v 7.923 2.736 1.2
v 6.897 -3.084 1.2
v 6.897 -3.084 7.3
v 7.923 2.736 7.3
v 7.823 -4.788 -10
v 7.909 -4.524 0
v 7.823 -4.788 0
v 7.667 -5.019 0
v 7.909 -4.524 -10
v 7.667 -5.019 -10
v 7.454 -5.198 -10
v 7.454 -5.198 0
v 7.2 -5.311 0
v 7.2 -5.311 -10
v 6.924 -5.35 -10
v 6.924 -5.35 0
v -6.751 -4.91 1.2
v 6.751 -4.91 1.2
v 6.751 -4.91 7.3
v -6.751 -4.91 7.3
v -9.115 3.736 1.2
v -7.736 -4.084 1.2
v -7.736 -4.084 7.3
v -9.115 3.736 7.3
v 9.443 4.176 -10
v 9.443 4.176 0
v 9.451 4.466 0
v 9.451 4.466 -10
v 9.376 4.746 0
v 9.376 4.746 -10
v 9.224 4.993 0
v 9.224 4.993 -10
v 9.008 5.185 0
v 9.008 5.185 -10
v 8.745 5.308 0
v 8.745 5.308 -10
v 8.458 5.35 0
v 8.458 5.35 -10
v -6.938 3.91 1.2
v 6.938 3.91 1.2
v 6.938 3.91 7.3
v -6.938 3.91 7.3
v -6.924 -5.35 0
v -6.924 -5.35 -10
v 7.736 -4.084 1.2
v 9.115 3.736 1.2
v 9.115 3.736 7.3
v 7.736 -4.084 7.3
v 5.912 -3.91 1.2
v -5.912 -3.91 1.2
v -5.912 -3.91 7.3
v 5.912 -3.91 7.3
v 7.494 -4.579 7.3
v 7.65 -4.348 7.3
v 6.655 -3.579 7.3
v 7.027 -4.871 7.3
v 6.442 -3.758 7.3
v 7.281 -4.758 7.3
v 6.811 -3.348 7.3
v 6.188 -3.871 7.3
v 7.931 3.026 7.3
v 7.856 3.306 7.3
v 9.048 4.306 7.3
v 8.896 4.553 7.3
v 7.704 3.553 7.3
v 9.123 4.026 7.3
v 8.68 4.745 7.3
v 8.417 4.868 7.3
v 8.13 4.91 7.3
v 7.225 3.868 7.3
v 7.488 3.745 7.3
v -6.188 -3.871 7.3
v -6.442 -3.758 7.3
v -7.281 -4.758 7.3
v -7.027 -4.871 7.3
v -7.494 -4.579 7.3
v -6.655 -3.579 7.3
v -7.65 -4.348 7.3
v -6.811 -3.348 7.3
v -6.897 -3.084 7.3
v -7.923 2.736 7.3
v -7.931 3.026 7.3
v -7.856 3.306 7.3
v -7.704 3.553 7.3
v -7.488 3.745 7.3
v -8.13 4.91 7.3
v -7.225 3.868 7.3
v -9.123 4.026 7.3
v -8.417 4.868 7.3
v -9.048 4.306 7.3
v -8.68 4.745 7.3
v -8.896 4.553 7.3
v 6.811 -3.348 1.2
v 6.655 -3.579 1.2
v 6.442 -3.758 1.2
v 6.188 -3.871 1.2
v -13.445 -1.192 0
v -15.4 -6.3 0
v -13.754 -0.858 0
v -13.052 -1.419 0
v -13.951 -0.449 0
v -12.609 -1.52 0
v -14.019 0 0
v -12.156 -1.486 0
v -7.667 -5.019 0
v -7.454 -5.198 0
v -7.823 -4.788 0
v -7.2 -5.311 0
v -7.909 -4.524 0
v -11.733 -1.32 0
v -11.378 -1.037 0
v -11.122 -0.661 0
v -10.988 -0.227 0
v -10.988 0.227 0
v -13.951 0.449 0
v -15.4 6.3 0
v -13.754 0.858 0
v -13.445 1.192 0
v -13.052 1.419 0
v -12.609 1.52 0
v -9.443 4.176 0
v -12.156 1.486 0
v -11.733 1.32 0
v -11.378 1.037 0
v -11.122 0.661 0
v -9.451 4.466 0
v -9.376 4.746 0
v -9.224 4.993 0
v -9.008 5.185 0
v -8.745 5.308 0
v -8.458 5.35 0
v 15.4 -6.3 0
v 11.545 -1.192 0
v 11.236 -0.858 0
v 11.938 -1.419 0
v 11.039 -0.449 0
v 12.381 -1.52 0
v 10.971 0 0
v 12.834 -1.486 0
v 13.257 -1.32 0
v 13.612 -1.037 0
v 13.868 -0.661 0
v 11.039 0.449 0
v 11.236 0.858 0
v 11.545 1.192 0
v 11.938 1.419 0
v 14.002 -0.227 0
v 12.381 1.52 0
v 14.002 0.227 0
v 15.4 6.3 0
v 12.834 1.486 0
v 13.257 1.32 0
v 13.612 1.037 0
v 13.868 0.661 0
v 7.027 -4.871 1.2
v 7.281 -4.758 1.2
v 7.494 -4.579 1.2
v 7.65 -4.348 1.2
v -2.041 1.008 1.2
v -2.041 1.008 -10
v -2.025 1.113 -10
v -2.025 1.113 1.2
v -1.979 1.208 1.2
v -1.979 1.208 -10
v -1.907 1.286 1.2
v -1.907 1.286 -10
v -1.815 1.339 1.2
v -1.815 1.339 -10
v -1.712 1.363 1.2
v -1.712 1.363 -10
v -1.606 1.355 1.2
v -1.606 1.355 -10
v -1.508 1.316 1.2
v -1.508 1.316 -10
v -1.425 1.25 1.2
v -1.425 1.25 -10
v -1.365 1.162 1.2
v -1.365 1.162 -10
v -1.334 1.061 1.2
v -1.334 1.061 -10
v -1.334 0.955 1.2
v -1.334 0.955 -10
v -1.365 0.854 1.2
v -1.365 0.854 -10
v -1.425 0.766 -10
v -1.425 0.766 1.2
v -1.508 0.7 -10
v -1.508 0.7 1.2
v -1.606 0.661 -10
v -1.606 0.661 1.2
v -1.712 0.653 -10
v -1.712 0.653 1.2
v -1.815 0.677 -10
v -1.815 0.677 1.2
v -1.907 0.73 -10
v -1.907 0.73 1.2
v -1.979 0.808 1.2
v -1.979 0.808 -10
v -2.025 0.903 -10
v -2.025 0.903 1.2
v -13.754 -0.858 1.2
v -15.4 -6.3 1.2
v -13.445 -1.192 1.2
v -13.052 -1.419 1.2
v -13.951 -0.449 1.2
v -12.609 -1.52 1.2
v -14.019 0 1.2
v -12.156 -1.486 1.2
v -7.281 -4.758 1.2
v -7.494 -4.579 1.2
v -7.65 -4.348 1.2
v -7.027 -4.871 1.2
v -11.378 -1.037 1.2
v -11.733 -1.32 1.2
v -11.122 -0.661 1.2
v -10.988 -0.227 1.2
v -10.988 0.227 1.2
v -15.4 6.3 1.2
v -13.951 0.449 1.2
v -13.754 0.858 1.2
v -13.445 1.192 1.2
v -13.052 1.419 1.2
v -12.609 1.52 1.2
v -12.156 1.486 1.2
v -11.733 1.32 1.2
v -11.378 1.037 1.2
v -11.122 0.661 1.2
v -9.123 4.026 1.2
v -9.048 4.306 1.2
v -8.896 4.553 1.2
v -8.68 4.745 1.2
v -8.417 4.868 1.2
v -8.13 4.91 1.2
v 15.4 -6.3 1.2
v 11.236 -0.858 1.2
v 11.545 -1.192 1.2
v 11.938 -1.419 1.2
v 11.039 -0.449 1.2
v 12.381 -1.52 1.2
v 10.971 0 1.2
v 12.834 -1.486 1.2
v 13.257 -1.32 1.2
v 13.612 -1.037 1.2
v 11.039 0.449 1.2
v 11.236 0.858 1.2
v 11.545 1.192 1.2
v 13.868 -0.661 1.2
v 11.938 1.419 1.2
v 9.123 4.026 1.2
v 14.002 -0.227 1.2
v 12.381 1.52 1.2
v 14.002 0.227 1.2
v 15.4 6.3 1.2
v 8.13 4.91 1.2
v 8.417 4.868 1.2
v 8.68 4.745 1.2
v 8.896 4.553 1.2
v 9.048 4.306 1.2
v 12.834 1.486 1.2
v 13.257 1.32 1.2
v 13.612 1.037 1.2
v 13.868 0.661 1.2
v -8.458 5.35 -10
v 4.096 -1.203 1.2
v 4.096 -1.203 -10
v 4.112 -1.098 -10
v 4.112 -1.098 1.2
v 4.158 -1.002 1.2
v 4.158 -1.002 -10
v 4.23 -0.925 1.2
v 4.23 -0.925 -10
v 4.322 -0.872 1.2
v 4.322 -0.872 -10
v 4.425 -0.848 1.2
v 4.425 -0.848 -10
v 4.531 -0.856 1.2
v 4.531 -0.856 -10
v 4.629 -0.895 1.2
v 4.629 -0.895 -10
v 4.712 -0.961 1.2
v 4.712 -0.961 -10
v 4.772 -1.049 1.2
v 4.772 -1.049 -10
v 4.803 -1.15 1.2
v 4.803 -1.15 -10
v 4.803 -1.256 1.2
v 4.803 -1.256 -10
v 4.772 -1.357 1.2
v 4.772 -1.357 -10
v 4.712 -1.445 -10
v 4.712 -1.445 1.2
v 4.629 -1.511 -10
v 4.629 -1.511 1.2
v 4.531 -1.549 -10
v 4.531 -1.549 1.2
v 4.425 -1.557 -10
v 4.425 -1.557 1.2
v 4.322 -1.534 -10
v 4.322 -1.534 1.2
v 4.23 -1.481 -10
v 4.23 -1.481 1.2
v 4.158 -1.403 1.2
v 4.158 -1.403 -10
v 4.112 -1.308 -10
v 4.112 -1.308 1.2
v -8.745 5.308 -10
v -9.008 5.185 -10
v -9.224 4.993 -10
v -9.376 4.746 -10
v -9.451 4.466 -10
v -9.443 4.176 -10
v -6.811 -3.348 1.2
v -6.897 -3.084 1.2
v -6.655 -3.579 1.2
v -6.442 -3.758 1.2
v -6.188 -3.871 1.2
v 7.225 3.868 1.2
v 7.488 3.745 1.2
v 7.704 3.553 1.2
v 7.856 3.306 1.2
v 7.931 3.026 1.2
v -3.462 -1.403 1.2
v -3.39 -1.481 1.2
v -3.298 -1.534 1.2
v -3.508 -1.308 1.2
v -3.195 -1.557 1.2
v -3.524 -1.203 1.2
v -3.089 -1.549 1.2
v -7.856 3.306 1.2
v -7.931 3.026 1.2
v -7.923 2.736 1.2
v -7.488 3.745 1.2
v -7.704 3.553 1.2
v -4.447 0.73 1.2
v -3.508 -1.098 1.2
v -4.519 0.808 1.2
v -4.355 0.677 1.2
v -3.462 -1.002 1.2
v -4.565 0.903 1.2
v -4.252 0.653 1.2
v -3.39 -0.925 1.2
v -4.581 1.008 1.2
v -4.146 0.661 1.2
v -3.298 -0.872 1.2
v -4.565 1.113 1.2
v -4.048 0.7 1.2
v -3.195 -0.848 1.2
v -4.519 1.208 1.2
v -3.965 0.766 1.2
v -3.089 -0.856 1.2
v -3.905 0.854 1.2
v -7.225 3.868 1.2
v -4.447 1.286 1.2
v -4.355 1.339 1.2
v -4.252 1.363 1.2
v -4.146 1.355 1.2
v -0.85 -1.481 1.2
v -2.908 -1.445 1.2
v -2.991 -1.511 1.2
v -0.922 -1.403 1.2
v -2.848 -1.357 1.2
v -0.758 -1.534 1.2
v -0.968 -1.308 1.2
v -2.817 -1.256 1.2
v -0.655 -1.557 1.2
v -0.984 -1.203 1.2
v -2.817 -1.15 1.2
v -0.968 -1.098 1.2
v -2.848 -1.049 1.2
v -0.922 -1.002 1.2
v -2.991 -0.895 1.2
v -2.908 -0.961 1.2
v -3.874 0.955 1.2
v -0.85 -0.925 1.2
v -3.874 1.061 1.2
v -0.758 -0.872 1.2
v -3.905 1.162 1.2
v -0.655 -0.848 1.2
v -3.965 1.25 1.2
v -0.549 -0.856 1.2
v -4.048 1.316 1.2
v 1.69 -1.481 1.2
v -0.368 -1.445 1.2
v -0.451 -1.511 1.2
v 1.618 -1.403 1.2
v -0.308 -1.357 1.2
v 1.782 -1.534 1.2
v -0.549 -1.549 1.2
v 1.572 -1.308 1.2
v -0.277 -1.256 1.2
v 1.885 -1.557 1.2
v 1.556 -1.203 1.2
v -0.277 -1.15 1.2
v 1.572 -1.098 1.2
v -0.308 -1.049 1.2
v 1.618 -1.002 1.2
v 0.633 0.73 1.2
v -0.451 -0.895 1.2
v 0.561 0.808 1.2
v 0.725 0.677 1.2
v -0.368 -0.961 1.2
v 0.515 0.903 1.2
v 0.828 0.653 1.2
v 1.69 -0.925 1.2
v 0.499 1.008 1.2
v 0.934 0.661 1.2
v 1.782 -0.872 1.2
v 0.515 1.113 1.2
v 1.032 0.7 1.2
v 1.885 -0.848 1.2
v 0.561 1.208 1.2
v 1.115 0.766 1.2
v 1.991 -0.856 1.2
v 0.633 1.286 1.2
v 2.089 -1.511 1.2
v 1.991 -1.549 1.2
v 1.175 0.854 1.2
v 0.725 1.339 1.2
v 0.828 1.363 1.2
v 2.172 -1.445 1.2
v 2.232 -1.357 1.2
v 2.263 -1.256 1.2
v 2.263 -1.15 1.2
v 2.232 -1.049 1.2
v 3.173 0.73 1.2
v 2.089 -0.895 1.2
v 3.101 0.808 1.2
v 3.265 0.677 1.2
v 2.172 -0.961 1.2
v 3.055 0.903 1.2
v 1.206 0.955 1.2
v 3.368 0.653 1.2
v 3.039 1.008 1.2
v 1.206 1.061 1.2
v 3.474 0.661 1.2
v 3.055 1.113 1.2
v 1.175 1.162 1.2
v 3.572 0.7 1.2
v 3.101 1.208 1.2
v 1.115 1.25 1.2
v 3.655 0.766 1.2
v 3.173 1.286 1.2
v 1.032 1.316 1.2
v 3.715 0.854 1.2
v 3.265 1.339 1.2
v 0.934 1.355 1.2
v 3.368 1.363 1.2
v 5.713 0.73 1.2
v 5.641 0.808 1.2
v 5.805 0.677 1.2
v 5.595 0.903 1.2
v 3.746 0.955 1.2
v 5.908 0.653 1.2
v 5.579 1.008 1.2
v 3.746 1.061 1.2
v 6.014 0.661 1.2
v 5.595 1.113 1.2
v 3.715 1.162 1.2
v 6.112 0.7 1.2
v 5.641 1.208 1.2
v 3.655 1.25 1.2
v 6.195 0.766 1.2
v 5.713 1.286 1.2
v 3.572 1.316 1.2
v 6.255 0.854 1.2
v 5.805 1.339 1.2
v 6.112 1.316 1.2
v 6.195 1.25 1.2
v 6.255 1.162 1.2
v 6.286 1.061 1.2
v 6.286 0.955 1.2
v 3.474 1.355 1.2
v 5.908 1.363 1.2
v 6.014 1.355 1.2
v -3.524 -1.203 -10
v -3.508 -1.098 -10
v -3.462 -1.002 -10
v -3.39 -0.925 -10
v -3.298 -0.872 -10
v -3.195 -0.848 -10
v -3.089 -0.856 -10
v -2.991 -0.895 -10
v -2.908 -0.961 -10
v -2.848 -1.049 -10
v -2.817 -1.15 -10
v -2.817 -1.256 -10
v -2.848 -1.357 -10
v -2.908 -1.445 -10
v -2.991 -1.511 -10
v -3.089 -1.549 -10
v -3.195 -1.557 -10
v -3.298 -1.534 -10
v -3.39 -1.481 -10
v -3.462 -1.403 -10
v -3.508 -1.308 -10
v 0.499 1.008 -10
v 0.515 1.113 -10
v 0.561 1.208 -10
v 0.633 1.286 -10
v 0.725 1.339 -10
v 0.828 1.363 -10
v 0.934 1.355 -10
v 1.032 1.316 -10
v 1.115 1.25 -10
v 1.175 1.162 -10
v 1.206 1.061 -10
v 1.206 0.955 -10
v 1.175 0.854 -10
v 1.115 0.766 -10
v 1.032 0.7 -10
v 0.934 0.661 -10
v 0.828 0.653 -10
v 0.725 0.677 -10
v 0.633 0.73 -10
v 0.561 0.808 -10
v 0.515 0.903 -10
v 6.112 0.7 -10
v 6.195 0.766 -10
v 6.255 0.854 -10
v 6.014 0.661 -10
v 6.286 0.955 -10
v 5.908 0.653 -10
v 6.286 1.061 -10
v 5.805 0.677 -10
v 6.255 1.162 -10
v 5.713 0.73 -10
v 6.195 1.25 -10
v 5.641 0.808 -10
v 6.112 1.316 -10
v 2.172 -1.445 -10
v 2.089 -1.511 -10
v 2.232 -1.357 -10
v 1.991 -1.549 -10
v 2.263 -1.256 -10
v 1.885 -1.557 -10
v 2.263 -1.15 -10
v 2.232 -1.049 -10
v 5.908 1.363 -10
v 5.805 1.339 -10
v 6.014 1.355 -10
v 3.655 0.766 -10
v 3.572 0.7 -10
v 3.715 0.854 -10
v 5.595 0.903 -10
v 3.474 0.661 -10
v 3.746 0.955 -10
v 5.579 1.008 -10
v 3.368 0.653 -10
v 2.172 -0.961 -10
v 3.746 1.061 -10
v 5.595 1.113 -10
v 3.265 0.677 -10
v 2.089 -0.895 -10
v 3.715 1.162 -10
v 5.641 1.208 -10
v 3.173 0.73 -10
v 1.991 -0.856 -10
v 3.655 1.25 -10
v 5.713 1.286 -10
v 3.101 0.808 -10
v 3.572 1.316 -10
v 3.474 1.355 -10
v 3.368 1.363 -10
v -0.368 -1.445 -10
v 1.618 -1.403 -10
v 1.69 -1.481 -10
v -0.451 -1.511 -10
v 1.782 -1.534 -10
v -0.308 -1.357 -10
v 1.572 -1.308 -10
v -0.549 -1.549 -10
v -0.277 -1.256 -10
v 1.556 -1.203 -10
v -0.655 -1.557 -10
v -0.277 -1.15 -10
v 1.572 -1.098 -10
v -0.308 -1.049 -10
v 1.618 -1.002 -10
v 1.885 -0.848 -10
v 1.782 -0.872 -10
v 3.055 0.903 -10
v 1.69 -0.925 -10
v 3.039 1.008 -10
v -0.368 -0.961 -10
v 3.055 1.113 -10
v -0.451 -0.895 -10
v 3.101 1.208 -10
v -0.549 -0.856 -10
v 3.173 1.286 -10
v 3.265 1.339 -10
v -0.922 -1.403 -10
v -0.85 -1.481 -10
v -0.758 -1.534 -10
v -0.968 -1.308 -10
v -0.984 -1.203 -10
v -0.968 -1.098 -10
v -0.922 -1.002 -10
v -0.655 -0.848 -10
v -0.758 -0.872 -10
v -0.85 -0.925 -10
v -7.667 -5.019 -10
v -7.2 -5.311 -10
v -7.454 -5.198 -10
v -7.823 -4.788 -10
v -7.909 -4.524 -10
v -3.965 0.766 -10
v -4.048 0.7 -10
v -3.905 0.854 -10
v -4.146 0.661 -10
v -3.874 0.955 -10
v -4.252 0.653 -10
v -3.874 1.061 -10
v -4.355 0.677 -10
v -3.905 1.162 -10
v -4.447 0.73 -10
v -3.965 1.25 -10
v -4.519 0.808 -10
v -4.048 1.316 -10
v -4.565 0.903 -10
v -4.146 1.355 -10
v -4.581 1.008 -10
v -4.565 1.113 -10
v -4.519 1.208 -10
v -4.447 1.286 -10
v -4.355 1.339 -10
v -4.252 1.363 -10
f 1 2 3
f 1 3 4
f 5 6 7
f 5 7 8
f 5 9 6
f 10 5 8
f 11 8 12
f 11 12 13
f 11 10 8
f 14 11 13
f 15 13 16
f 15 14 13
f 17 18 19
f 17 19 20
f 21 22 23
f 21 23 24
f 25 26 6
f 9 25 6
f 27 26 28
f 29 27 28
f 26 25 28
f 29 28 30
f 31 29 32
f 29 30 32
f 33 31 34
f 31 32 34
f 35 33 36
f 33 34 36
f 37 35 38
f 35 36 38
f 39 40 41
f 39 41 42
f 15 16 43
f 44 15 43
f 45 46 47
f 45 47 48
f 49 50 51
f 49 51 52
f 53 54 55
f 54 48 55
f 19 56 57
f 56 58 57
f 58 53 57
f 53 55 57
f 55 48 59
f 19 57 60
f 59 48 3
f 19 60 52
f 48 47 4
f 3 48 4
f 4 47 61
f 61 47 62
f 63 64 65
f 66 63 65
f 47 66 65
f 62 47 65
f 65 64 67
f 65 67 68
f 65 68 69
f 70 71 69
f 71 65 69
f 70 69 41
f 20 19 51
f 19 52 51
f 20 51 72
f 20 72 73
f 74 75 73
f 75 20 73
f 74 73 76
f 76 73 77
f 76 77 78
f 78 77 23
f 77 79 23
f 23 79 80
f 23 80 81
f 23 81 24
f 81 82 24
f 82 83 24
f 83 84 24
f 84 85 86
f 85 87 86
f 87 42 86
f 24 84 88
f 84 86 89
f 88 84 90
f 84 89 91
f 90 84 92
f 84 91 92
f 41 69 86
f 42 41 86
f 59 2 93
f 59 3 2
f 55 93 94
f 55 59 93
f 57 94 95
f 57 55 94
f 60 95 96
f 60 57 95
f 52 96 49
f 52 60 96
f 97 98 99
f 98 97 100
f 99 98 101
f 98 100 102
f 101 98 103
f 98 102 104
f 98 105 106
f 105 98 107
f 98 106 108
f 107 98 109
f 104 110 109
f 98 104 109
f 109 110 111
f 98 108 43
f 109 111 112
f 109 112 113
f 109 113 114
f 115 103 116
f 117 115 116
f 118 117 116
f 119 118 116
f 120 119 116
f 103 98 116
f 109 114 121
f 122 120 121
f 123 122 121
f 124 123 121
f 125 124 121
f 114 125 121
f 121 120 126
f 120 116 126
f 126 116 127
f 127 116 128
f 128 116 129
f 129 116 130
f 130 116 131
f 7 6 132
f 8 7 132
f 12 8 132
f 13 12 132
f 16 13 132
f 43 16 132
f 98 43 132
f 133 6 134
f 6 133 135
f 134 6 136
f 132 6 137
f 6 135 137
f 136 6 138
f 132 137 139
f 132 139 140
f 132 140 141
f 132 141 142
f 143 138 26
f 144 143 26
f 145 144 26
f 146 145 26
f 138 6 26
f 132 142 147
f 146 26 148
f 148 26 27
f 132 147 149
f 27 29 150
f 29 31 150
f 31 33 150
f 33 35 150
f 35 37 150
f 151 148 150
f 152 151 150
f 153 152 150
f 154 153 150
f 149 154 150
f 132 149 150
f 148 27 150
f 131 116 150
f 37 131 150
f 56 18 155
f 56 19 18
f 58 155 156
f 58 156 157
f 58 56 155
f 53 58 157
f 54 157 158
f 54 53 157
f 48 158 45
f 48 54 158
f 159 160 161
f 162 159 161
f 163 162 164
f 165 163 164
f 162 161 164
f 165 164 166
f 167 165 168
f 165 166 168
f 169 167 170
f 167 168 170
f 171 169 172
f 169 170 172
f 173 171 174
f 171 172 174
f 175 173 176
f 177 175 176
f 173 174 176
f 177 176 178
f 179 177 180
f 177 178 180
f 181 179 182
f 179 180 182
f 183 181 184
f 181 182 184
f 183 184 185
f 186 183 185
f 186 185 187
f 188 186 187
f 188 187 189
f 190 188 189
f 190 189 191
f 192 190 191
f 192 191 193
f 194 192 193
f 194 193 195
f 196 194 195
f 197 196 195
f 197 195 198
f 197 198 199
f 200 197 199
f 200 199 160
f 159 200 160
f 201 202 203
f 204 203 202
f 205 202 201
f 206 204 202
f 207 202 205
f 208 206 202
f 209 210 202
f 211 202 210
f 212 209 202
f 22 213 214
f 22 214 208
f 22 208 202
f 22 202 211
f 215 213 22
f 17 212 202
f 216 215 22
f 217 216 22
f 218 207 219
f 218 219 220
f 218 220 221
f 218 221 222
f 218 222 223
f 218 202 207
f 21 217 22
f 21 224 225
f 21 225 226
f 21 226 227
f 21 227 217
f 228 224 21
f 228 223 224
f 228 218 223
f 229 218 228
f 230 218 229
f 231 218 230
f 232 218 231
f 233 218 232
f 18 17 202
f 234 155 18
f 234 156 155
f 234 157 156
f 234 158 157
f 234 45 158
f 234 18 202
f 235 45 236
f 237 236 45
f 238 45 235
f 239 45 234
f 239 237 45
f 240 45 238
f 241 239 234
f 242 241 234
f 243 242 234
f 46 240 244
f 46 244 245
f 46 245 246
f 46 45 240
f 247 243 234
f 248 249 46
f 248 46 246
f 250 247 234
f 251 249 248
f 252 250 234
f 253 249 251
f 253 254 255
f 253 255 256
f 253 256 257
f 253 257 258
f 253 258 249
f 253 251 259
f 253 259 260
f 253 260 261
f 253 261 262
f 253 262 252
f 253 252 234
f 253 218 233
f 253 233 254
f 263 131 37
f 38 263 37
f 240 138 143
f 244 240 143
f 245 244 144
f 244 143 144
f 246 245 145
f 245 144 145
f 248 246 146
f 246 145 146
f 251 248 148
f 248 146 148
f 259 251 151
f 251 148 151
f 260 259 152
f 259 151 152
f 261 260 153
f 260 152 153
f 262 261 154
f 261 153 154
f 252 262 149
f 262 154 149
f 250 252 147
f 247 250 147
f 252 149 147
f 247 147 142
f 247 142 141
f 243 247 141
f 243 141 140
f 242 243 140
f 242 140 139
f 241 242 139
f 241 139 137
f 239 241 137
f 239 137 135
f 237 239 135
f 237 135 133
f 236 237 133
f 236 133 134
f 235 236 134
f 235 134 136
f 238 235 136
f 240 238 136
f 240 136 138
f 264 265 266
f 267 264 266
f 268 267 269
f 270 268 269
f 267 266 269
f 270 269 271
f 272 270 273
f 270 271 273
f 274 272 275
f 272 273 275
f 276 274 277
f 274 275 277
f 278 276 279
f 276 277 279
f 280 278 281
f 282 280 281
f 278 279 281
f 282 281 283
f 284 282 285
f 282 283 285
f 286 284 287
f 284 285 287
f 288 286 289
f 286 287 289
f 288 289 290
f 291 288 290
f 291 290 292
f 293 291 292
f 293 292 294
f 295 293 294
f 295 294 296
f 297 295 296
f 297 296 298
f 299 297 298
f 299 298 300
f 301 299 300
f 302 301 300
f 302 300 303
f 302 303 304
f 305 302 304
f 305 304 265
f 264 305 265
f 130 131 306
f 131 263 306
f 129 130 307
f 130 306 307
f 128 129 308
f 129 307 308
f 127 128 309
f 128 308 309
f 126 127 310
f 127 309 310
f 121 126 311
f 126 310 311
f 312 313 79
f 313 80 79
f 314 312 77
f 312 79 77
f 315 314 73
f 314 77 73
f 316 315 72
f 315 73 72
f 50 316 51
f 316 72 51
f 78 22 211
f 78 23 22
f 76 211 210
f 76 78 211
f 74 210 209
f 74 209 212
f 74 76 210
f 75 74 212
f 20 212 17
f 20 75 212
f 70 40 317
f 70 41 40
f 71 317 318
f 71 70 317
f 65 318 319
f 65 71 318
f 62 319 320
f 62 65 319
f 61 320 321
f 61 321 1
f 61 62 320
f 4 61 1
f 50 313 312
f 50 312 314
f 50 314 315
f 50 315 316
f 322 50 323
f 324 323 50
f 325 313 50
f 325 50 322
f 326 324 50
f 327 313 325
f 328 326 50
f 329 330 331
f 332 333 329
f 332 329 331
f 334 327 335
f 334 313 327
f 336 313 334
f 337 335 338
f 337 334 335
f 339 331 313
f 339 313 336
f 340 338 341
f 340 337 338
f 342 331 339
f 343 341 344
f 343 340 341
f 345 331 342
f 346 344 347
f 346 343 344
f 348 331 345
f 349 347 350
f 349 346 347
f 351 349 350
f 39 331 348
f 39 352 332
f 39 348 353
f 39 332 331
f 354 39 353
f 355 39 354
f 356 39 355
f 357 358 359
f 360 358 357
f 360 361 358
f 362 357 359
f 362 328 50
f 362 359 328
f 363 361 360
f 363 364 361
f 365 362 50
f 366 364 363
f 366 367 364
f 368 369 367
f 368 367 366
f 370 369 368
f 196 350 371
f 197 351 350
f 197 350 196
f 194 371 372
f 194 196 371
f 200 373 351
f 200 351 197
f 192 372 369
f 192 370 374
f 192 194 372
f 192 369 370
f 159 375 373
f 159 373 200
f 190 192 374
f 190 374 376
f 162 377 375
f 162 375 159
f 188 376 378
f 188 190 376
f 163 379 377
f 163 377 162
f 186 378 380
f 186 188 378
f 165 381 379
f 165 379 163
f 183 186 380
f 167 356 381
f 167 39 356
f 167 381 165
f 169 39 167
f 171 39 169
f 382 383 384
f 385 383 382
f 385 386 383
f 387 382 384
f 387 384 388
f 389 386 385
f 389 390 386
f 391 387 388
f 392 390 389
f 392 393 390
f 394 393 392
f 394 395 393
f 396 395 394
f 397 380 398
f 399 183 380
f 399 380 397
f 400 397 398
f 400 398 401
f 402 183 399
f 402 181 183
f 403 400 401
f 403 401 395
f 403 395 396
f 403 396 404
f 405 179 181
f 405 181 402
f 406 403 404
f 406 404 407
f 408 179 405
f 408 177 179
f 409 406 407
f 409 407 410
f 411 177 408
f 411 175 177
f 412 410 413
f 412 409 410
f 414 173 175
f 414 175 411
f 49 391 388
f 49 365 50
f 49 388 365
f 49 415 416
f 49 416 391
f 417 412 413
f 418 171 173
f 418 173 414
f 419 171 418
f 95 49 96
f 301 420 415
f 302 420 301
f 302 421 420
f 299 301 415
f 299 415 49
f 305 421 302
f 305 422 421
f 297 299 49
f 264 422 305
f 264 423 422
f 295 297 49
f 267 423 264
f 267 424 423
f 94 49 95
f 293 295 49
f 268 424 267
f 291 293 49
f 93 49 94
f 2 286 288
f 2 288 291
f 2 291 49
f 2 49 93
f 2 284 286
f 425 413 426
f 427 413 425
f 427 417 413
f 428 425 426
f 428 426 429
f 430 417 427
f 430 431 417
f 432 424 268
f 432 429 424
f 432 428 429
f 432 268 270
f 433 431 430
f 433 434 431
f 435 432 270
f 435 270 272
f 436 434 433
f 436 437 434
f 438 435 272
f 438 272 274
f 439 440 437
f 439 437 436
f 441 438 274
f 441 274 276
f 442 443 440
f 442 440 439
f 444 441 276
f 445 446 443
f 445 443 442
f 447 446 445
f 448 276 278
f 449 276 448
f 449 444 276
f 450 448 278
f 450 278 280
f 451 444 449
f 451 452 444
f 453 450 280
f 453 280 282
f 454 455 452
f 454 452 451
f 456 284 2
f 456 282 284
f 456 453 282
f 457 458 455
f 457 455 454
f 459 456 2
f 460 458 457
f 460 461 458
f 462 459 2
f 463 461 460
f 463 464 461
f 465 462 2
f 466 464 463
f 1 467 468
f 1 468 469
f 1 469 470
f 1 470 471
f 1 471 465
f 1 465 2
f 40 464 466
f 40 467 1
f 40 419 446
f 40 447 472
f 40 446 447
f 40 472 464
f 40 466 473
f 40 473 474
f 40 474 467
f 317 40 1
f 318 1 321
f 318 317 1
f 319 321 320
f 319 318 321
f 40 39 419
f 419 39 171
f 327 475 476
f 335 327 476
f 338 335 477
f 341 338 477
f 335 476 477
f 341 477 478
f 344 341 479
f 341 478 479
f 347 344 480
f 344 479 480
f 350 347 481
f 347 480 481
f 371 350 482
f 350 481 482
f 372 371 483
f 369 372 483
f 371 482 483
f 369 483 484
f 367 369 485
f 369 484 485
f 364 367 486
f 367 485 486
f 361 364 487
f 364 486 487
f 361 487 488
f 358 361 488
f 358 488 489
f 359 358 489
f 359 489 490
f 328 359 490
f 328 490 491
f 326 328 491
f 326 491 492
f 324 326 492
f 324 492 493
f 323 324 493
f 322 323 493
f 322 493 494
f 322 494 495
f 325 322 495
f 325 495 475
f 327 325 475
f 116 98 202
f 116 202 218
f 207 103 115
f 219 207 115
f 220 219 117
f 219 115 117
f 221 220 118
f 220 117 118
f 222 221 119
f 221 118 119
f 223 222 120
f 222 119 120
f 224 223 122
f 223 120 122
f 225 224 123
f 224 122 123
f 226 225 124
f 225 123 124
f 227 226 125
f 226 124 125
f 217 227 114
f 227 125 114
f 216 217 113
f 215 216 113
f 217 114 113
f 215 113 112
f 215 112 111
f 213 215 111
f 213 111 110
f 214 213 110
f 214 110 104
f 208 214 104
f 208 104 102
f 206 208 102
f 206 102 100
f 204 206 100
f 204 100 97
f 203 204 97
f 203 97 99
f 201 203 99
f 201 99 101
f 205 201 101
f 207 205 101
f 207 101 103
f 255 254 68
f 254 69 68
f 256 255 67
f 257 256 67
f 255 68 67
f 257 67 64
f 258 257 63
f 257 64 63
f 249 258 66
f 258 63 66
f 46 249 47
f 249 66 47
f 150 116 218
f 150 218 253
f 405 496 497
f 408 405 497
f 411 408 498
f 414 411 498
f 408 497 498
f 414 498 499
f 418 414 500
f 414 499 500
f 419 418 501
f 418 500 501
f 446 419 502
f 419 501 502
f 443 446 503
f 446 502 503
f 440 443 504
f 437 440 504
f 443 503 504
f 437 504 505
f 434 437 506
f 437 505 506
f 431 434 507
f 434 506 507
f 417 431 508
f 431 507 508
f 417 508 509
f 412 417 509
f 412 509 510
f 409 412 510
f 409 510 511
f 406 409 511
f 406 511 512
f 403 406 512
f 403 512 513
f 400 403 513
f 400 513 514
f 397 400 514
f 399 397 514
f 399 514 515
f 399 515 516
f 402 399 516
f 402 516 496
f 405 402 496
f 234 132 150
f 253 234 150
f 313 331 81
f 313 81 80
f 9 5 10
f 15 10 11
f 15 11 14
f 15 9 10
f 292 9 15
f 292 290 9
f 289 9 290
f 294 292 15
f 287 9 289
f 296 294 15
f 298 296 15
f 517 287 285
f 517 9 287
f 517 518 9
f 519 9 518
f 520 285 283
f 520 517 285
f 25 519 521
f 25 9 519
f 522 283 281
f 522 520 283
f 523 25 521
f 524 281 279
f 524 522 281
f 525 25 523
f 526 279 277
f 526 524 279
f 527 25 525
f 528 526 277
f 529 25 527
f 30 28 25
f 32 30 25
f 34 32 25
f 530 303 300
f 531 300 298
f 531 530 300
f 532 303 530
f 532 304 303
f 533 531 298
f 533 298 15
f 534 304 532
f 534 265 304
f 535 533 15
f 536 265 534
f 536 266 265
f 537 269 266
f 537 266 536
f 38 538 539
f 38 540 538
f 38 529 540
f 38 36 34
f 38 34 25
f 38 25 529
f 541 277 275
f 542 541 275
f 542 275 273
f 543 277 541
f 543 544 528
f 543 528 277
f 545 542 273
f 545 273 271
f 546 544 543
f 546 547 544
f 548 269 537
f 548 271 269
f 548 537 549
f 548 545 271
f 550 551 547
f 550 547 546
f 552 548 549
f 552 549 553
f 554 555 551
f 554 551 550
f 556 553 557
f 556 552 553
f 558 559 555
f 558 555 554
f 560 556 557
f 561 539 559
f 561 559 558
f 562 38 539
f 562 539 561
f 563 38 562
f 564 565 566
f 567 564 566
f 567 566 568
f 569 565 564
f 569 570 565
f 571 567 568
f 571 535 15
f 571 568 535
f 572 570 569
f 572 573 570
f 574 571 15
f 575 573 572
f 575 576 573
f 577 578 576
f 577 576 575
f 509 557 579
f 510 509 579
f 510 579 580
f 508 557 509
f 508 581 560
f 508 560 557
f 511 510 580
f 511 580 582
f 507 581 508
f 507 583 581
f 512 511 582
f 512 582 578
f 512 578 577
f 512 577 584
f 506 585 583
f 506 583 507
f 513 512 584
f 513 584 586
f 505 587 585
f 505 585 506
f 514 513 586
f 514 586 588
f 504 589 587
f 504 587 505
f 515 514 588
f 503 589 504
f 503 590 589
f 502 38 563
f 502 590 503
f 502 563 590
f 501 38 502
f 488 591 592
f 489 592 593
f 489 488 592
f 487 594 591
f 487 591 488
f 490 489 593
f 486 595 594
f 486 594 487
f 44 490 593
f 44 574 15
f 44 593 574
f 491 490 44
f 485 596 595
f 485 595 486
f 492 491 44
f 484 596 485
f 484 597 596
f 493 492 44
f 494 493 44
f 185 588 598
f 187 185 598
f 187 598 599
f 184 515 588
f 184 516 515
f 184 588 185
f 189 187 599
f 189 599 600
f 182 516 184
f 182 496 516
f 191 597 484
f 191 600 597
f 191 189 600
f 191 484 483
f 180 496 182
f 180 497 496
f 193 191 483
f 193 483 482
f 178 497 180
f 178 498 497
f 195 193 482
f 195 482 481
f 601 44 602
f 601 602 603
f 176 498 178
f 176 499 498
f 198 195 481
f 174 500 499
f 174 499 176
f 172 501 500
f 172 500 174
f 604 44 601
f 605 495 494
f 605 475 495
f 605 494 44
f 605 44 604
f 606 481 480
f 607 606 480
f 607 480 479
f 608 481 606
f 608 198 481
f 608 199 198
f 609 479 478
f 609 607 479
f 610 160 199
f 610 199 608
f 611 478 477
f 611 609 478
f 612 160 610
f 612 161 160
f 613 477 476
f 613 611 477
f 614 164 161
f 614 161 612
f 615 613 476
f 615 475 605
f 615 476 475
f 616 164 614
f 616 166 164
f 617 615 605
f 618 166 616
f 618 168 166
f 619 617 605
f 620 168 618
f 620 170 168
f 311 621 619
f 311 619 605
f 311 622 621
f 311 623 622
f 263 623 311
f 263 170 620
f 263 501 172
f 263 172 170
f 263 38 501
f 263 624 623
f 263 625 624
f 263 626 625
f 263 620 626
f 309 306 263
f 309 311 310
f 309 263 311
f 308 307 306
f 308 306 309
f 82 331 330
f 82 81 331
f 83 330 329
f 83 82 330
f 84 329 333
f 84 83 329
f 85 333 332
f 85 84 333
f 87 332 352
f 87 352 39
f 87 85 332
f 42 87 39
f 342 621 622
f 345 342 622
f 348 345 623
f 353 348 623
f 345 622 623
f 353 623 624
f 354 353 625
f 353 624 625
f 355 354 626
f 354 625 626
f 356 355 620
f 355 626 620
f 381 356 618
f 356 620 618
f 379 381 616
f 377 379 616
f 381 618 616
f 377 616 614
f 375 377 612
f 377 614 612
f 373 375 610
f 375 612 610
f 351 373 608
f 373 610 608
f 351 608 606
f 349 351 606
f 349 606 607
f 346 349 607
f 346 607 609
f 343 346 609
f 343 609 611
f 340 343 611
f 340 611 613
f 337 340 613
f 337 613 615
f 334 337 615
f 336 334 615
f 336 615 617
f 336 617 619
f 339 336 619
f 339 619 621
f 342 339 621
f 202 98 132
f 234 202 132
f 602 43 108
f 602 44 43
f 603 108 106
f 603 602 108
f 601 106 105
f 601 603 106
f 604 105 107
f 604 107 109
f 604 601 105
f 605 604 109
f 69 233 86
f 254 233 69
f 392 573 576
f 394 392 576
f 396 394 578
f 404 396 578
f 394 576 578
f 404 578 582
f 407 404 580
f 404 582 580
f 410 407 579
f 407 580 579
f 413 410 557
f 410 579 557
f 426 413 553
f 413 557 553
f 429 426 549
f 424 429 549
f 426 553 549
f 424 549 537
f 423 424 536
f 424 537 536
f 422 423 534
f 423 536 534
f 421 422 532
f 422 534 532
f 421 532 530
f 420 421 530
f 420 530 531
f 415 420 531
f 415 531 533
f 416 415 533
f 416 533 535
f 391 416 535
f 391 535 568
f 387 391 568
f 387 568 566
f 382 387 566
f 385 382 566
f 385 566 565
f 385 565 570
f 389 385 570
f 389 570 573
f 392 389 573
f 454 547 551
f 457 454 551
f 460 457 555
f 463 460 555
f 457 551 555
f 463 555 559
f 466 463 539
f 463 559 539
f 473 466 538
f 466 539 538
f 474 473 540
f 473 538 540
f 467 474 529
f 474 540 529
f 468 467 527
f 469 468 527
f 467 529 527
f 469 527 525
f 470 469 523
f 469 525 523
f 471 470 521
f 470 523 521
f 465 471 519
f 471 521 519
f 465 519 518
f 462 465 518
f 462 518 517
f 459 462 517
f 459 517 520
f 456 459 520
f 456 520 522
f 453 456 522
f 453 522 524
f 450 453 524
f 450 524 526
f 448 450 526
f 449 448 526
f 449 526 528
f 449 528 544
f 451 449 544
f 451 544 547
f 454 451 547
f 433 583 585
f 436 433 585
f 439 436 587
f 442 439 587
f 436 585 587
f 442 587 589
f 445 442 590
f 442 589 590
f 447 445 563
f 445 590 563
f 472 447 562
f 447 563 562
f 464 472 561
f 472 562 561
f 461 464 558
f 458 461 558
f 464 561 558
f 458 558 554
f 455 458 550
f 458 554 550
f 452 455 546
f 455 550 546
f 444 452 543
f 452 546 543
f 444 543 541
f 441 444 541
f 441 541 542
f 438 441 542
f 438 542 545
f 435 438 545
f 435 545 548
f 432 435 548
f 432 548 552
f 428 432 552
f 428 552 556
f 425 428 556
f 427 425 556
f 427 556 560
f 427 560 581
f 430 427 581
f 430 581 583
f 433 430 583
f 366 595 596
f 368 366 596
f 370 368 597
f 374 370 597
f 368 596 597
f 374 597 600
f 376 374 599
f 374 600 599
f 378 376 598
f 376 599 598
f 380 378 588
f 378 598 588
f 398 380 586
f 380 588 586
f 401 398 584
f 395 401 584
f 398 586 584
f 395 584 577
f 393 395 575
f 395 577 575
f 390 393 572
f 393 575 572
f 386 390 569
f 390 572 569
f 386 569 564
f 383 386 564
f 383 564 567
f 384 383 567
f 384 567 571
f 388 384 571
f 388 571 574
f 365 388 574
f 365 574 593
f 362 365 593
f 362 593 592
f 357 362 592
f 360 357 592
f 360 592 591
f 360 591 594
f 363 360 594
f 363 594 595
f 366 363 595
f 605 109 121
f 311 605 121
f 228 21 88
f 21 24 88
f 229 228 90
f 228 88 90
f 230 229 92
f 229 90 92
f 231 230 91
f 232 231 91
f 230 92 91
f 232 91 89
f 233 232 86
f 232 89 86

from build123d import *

# Parameters (mm, degrees)
SKETCH_1_W             = 30.8
SKETCH_1_H             = 12.6
EXTRUDE_1_DEPTH        = 1.2
EXTRUDE_2_DEPTH        = 6.1
EXTRUDE_3_DEPTH        = 10
HOLE_WIZARD_0000_1_D   = 0.7112
HOLE_WIZARD_0000_2_D   = 0.7112
PATTERN_LINEAR_1_COUNT = 5
PATTERN_LINEAR_1_PITCH = 2.54
PATTERN_LINEAR_2_COUNT = 4
PATTERN_LINEAR_2_PITCH = 2.54
HOLE_WIZARD_3_2_D      = 3.048
FILLET_1_R             = 1


with BuildPart() as part:
    # ｽｹｯﾁ1 → ﾎﾞｽ - 押し出し1 (new body)
    with BuildSketch(Plane.XY):
        Rectangle(SKETCH_1_W, SKETCH_1_H)
    extrude(amount=EXTRUDE_1_DEPTH)

    # ｽｹｯﾁ2 → ﾎﾞｽ - 押し出し2 (add)
    with BuildSketch(Plane.XY.offset(1.2)):
        Polygon((-9.321753593, 4.91), (9.321753593, 4.91), (7.590222642, -4.91), (-7.590222642, -4.91), align=None)
        Polygon((-6.751123011, -3.91), (6.751123011, -3.91), (8.13, 3.91), (-8.13, 3.91), align=None, mode=Mode.SUBTRACT)
    extrude(amount=EXTRUDE_2_DEPTH)

    # ｽｹｯﾁ3 → ﾎﾞｽ - 押し出し3 (add)
    with BuildSketch(Plane(origin=(0, 0, 0), x_dir=(-1, 0, 0), z_dir=(0, 0, -1))):
        Polygon((-7.763301306, -5.35), (7.763301306, -5.35), (9.65, 5.35), (-9.65, 5.35), align=None)
    extrude(amount=EXTRUDE_3_DEPTH)

    # #0000 すきま穴1 (through all)
    with Locations(Plane(origin=(-4.225439316, 1.008007938, 1.2), x_dir=(1, 0, 0), z_dir=(0, 0, 1))):
        with Locations((0, 0)):
            hole_wizard_0000_1 = Hole(HOLE_WIZARD_0000_1_D / 2)

    # #0000 すきま穴2 (through all)
    with Locations(Plane(origin=(-3.168321124, -1.202810505, 1.2), x_dir=(1, 0, 0), z_dir=(0, 0, 1))):
        with Locations((0, 0)):
            hole_wizard_0000_2 = Hole(HOLE_WIZARD_0000_2_D / 2)

    # 直線ﾊﾟﾀｰﾝ1: #0000 すきま穴1 ×5
    with Locations(*[(i * PATTERN_LINEAR_1_PITCH, 0, 0) for i in range(1, PATTERN_LINEAR_1_COUNT)]):
        add(hole_wizard_0000_1, mode=Mode.SUBTRACT)

    # 直線ﾊﾟﾀｰﾝ2: #0000 すきま穴2 ×4
    with Locations(*[(i * PATTERN_LINEAR_2_PITCH, 0, 0) for i in range(1, PATTERN_LINEAR_2_COUNT)]):
        add(hole_wizard_0000_2, mode=Mode.SUBTRACT)

    # #3 すきま穴2 (through all)
    with Locations(Plane(origin=(-12.495, 0, 1.2), x_dir=(1, 0, 0), z_dir=(0, 0, 1))):
        with Locations((0, 0), (24.99, 0)):
            Hole(HOLE_WIZARD_3_2_D / 2)

    # ﾌｨﾚｯﾄ1
    fillet_1_edges = [part.edges().sort_by_distance(p)[0] for p in [
        (-9.321753593, 4.91, 4.25),
        (-7.590222642, -4.91, 4.25),
        (7.590222642, -4.91, 4.25),
        (9.321753593, 4.91, 4.25),
        (8.13, 3.91, 4.25),
        (-8.13, 3.91, 4.25),
        (-6.751123011, -3.91, 4.25),
        (6.751123011, -3.91, 4.25),
        (-7.763301306, -5.35, -5),
        (-9.65, 5.35, -5),
        (9.65, 5.35, -5),
        (7.763301306, -5.35, -5),
    ]]
    fillet(fillet_1_edges, radius=FILLET_1_R)


solid = part.part
